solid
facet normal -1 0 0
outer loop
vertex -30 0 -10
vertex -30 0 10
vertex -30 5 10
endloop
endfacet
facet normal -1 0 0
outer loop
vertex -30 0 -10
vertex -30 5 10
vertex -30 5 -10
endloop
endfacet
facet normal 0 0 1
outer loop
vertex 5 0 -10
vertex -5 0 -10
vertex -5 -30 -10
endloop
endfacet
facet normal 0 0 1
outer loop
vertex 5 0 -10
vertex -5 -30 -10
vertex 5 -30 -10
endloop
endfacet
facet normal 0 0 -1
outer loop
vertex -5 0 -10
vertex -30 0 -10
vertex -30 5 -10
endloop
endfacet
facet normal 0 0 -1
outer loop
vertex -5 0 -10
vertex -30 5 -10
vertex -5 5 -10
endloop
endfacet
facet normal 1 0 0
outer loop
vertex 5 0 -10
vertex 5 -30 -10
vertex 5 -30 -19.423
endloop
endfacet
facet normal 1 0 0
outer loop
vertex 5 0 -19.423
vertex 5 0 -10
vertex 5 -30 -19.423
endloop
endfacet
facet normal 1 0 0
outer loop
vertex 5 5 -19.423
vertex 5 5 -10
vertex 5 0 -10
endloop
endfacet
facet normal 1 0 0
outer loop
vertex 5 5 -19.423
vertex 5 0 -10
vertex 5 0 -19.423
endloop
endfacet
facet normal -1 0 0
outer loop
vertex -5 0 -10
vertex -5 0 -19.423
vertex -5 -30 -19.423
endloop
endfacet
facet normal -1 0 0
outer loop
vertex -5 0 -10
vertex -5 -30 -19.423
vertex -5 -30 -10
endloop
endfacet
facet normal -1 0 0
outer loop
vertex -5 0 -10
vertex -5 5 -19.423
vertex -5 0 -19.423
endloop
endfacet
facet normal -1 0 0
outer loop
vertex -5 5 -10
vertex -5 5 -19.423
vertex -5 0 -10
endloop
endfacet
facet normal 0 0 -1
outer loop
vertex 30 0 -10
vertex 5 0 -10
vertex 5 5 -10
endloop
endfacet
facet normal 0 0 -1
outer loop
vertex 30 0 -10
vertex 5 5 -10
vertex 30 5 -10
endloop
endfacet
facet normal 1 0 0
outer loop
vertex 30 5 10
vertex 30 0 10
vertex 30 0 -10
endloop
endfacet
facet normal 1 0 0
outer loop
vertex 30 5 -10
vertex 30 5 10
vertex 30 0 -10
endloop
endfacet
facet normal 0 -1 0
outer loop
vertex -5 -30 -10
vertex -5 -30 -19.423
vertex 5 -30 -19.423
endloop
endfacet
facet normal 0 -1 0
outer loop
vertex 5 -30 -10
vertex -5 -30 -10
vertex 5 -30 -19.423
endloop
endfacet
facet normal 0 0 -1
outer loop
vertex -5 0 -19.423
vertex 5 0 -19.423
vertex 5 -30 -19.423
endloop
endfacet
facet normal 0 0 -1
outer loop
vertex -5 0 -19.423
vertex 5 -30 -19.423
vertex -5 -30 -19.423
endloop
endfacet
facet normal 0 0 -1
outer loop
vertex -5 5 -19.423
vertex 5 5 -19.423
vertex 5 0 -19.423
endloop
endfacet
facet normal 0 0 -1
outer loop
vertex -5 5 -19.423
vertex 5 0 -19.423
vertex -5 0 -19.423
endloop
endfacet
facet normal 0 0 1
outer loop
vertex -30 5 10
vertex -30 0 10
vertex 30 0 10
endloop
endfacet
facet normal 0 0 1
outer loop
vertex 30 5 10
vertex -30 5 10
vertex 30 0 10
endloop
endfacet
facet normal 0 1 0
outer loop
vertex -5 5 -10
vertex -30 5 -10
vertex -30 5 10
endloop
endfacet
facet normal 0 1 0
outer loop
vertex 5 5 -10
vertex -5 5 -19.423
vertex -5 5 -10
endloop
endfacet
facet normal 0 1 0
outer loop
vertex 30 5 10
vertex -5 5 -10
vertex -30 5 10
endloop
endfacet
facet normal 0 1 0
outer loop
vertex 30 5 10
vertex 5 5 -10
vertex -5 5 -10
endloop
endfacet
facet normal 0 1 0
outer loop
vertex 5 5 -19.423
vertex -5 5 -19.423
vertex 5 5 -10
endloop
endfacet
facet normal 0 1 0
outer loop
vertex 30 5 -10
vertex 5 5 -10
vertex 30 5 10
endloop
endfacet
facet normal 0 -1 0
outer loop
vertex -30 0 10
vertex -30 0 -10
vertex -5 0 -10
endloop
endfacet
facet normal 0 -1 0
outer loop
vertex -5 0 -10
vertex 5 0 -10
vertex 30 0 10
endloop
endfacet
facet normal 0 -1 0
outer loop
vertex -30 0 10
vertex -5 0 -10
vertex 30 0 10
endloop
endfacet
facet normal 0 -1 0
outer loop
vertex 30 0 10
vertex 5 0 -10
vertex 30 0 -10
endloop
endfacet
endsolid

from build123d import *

# Parameters (mm, degrees)
BOSS_EXTRUDE1_DEPTH = 5
BOSS_EXTRUDE2_DEPTH = 30


with BuildPart() as part:
    # Sketch2 → Boss-Extrude1 (new body)
    with BuildSketch(Plane(origin=(0, 0, 0), x_dir=(1, 0, 0), z_dir=(0, 1, 0))):
        Polygon((-5, 10), (-30, 10), (-30, -10), (30, -10), (30, 10), (5, 10), (5, 19.423036009), (-5, 19.423036009), align=None)
    extrude(amount=BOSS_EXTRUDE1_DEPTH)

    # Sketch2<3> → Boss-Extrude2 (add)
    with BuildSketch(Plane(origin=(0, 0, 0), x_dir=(1, 0, 0), z_dir=(0, 1, 0))):
        Polygon((-5, 19.423036009), (-5, 10), (0, 10), (5, 10), (5, 19.423036009), align=None)
    extrude(amount=-BOSS_EXTRUDE2_DEPTH)


solid = part.part
